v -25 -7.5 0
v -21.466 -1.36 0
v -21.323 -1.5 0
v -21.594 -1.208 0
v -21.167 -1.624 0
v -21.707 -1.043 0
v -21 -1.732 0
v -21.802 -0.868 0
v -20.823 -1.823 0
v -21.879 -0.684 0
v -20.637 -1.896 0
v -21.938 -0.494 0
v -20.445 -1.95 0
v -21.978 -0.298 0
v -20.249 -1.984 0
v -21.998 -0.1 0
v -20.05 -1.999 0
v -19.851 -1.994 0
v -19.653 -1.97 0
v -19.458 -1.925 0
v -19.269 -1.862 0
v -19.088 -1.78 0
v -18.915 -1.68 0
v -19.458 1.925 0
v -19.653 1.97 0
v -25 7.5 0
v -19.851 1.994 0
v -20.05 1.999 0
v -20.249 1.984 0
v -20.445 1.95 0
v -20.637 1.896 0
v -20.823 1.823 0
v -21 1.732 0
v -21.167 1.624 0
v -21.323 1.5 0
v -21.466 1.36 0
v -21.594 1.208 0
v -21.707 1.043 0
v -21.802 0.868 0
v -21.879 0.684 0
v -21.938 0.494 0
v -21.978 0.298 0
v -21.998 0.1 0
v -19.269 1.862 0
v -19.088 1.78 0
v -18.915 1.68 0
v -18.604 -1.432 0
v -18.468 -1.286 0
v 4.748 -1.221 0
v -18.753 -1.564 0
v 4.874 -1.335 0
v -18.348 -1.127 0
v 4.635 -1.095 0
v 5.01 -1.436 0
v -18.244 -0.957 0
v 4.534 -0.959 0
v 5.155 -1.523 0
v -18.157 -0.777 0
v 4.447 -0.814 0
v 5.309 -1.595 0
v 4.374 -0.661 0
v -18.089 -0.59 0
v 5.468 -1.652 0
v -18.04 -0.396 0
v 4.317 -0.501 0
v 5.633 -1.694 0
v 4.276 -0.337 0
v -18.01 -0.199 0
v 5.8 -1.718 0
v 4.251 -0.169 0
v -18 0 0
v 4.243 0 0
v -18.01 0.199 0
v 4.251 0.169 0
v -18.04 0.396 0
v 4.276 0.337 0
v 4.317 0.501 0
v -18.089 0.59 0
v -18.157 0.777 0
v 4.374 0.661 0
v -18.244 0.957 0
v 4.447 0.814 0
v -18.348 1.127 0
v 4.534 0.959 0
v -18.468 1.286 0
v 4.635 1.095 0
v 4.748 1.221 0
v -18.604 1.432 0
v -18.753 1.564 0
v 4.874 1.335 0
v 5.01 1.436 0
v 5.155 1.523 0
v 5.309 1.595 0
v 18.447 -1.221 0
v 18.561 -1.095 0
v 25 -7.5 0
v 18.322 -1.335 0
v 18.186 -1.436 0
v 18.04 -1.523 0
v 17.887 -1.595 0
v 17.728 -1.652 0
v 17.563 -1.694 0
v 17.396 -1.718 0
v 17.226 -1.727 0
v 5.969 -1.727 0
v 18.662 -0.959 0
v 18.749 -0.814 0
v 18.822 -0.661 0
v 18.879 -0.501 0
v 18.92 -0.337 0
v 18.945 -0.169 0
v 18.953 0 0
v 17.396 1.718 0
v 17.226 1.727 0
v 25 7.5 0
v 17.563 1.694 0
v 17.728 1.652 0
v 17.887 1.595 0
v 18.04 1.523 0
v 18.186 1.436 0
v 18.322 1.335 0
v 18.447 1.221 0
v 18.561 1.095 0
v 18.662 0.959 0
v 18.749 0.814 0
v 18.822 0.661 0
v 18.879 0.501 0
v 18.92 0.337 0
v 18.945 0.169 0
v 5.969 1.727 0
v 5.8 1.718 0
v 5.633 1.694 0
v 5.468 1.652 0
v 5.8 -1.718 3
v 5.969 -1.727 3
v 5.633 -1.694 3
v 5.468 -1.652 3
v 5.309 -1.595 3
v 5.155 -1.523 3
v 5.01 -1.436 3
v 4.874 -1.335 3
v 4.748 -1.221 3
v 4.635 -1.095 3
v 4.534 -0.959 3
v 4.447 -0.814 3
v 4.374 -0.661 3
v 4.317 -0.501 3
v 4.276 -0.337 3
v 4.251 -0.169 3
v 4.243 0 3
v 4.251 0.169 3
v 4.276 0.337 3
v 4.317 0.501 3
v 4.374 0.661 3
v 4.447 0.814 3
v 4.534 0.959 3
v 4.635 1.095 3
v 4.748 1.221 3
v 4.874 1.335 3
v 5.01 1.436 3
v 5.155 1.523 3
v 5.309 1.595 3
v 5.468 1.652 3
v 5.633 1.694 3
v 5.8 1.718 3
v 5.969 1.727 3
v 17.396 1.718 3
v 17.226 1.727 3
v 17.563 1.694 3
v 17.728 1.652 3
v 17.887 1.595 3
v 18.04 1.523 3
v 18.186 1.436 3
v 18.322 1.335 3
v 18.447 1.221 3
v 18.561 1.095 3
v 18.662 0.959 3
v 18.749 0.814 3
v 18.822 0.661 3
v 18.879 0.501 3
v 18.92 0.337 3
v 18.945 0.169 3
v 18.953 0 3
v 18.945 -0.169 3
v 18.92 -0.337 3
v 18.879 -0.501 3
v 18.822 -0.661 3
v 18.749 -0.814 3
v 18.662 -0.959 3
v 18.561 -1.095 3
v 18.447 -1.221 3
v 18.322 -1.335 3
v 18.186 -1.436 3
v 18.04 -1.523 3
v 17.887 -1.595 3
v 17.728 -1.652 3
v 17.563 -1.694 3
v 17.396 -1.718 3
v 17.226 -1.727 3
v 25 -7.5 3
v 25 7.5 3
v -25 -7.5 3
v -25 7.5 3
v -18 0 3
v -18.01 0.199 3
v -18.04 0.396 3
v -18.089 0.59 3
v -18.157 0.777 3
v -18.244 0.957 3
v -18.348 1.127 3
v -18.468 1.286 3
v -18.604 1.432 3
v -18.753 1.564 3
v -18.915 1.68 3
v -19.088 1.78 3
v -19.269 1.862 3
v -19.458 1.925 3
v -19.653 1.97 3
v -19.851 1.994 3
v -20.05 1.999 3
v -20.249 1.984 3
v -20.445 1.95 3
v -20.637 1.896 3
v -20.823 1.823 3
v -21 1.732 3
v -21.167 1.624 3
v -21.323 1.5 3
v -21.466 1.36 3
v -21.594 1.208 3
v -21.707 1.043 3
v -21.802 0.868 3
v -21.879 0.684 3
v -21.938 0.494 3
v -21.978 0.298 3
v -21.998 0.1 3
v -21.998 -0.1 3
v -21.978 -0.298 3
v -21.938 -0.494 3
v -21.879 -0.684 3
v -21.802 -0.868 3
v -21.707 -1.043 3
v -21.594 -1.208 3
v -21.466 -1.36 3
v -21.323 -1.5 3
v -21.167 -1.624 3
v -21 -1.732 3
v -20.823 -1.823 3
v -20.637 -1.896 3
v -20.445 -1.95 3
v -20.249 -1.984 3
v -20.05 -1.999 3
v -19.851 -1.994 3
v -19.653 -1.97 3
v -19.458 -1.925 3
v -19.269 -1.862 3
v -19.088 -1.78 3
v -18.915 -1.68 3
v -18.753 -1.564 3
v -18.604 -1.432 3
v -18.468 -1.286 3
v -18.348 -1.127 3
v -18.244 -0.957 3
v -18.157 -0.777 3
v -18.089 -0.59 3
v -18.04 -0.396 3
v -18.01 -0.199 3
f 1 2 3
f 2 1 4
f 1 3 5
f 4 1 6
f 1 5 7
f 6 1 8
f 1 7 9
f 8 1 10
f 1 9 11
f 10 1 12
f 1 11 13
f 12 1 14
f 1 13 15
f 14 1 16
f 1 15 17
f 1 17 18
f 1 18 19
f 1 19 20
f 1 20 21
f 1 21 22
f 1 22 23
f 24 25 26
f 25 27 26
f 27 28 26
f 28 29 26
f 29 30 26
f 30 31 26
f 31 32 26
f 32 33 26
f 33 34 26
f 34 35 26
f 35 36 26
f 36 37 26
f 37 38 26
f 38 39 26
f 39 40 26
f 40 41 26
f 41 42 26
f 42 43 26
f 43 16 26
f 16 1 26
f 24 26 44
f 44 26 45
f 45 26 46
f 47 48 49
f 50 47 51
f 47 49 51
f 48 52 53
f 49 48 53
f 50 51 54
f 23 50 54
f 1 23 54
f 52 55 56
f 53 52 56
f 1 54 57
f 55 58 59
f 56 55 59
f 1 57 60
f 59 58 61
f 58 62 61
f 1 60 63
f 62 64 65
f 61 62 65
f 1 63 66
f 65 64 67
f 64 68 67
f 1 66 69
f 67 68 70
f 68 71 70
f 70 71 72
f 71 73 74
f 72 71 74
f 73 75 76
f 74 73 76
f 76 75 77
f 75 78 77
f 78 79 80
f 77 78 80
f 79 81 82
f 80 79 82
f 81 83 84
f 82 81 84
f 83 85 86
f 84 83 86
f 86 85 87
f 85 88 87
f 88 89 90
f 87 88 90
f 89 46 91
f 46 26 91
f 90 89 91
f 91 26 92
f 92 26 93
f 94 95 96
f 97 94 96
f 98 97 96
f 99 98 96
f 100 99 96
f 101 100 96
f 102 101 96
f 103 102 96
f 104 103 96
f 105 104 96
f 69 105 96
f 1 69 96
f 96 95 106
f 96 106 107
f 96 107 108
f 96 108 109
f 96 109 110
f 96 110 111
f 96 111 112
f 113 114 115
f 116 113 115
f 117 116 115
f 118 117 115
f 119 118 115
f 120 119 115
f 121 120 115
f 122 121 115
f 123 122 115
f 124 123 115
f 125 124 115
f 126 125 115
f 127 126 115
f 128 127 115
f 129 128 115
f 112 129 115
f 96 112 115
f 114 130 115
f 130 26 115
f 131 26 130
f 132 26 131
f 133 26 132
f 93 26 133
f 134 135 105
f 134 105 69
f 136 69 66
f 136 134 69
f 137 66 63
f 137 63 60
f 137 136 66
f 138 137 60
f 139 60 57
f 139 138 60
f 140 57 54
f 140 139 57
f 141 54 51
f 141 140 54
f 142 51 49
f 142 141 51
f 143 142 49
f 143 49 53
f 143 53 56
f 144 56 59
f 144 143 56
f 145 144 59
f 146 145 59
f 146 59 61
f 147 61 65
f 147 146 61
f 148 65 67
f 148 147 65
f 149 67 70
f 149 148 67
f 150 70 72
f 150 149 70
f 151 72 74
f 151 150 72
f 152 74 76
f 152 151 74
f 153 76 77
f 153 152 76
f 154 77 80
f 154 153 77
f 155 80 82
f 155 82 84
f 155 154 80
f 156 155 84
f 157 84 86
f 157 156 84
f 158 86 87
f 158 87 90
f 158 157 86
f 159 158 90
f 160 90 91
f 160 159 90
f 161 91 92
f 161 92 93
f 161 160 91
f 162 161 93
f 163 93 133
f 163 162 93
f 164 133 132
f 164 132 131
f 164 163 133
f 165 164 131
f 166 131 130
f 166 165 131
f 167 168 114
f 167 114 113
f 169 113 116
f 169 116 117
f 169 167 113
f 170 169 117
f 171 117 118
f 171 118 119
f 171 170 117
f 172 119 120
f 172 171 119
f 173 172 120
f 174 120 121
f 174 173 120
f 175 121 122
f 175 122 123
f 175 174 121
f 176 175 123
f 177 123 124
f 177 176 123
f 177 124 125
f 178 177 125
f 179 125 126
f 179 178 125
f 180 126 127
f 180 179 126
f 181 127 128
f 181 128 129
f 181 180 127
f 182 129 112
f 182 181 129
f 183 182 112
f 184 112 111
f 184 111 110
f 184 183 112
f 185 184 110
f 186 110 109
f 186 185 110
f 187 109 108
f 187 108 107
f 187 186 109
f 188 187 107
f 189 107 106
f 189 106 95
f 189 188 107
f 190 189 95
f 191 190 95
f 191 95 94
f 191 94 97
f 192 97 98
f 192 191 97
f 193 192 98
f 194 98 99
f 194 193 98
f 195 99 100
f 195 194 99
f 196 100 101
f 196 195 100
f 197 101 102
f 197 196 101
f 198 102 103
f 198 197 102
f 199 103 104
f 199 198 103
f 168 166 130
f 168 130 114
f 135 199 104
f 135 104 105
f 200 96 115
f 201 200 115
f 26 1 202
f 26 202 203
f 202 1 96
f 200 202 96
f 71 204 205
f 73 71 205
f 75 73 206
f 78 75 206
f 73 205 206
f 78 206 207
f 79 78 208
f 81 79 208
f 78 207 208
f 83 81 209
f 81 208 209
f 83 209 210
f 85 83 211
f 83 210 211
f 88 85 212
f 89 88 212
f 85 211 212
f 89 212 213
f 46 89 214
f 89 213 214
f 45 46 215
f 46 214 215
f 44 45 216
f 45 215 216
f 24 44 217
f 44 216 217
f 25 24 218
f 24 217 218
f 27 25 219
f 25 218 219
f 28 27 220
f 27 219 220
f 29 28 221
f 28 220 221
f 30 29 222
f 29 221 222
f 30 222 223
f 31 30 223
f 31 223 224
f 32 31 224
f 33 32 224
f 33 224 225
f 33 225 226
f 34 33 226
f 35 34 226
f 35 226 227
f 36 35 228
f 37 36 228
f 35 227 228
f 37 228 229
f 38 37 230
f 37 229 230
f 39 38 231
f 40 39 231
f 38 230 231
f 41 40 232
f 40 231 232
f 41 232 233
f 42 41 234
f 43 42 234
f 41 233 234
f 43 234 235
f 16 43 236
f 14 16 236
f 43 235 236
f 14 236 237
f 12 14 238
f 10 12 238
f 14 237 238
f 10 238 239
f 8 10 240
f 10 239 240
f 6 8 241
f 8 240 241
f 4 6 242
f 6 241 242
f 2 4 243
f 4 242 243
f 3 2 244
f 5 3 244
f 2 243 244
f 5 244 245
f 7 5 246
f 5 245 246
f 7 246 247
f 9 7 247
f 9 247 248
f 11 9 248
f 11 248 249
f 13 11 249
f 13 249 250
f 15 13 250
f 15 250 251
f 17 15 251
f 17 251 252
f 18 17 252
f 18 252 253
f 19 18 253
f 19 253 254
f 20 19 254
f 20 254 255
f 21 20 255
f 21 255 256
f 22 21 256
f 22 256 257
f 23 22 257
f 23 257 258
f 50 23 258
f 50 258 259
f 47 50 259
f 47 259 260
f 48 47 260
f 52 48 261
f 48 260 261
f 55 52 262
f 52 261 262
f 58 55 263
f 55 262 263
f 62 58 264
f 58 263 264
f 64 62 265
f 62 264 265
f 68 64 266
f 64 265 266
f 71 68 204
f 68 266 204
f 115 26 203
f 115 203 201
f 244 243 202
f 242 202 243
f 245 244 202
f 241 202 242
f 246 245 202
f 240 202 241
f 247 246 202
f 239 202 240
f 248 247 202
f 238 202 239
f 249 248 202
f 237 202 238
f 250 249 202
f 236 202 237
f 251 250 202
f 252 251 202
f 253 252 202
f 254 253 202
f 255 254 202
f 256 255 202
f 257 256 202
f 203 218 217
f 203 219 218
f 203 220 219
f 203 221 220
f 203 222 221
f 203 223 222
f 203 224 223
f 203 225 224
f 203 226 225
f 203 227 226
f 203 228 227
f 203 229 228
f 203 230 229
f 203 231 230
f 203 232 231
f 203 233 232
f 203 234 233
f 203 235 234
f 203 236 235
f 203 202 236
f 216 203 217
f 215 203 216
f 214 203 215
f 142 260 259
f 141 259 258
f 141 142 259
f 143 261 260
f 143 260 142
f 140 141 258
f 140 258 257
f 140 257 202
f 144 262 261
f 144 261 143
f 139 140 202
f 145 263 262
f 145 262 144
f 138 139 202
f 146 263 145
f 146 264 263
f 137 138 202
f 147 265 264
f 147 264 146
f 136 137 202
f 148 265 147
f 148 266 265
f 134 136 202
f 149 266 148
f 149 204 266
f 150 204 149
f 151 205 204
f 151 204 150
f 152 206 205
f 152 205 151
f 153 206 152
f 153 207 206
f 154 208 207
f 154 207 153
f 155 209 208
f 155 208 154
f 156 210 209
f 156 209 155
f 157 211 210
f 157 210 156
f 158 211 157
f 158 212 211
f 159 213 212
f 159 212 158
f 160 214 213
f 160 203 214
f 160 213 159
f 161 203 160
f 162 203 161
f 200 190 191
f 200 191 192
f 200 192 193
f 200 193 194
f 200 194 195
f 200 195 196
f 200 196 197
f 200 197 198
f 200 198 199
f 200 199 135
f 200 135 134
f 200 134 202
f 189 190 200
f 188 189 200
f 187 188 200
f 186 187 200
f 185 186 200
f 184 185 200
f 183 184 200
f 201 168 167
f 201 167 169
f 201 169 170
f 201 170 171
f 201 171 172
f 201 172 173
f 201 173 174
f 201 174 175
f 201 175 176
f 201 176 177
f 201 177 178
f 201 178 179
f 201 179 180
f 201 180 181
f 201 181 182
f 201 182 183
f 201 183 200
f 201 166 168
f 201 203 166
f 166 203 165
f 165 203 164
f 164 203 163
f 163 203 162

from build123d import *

# Parameters (mm, degrees)
SKETCH1_W           = 50
SKETCH1_H           = 15
BOSS_EXTRUDE1_DEPTH = 3
SKETCH2_R           = 2
CUT_EXTRUDE1_DEPTH  = 3
CUT_EXTRUDE2_DEPTH  = 3


with BuildPart() as part:
    # Sketch1 → Boss-Extrude1 (new body)
    with BuildSketch(Plane.XY):
        Rectangle(SKETCH1_W, SKETCH1_H)
    extrude(amount=BOSS_EXTRUDE1_DEPTH)

    # Sketch2 → Cut-Extrude1 (cut)
    with BuildSketch(Plane.XY.offset(3)):
        with Locations((-20, 0)):
            Circle(SKETCH2_R)
    extrude(amount=-CUT_EXTRUDE1_DEPTH, mode=Mode.SUBTRACT)

    # Sketch3 → Cut-Extrude2 (cut)
    with BuildSketch(Plane.XY.offset(3)):
        with BuildLine():
            Line((5.969403334, 1.726719429), (17.226282515, 1.726719429))
            ThreePointArc((17.226282515, 1.726719429), (18.953001944, 0), (17.226282515, -1.726719429))
            Line((17.226282515, -1.726719429), (5.969403334, -1.726719429))
            ThreePointArc((5.969403334, -1.726719429), (4.242683906, 0), (5.969403334, 1.726719429))
        make_face()
    extrude(amount=-CUT_EXTRUDE2_DEPTH, mode=Mode.SUBTRACT)


solid = part.part
